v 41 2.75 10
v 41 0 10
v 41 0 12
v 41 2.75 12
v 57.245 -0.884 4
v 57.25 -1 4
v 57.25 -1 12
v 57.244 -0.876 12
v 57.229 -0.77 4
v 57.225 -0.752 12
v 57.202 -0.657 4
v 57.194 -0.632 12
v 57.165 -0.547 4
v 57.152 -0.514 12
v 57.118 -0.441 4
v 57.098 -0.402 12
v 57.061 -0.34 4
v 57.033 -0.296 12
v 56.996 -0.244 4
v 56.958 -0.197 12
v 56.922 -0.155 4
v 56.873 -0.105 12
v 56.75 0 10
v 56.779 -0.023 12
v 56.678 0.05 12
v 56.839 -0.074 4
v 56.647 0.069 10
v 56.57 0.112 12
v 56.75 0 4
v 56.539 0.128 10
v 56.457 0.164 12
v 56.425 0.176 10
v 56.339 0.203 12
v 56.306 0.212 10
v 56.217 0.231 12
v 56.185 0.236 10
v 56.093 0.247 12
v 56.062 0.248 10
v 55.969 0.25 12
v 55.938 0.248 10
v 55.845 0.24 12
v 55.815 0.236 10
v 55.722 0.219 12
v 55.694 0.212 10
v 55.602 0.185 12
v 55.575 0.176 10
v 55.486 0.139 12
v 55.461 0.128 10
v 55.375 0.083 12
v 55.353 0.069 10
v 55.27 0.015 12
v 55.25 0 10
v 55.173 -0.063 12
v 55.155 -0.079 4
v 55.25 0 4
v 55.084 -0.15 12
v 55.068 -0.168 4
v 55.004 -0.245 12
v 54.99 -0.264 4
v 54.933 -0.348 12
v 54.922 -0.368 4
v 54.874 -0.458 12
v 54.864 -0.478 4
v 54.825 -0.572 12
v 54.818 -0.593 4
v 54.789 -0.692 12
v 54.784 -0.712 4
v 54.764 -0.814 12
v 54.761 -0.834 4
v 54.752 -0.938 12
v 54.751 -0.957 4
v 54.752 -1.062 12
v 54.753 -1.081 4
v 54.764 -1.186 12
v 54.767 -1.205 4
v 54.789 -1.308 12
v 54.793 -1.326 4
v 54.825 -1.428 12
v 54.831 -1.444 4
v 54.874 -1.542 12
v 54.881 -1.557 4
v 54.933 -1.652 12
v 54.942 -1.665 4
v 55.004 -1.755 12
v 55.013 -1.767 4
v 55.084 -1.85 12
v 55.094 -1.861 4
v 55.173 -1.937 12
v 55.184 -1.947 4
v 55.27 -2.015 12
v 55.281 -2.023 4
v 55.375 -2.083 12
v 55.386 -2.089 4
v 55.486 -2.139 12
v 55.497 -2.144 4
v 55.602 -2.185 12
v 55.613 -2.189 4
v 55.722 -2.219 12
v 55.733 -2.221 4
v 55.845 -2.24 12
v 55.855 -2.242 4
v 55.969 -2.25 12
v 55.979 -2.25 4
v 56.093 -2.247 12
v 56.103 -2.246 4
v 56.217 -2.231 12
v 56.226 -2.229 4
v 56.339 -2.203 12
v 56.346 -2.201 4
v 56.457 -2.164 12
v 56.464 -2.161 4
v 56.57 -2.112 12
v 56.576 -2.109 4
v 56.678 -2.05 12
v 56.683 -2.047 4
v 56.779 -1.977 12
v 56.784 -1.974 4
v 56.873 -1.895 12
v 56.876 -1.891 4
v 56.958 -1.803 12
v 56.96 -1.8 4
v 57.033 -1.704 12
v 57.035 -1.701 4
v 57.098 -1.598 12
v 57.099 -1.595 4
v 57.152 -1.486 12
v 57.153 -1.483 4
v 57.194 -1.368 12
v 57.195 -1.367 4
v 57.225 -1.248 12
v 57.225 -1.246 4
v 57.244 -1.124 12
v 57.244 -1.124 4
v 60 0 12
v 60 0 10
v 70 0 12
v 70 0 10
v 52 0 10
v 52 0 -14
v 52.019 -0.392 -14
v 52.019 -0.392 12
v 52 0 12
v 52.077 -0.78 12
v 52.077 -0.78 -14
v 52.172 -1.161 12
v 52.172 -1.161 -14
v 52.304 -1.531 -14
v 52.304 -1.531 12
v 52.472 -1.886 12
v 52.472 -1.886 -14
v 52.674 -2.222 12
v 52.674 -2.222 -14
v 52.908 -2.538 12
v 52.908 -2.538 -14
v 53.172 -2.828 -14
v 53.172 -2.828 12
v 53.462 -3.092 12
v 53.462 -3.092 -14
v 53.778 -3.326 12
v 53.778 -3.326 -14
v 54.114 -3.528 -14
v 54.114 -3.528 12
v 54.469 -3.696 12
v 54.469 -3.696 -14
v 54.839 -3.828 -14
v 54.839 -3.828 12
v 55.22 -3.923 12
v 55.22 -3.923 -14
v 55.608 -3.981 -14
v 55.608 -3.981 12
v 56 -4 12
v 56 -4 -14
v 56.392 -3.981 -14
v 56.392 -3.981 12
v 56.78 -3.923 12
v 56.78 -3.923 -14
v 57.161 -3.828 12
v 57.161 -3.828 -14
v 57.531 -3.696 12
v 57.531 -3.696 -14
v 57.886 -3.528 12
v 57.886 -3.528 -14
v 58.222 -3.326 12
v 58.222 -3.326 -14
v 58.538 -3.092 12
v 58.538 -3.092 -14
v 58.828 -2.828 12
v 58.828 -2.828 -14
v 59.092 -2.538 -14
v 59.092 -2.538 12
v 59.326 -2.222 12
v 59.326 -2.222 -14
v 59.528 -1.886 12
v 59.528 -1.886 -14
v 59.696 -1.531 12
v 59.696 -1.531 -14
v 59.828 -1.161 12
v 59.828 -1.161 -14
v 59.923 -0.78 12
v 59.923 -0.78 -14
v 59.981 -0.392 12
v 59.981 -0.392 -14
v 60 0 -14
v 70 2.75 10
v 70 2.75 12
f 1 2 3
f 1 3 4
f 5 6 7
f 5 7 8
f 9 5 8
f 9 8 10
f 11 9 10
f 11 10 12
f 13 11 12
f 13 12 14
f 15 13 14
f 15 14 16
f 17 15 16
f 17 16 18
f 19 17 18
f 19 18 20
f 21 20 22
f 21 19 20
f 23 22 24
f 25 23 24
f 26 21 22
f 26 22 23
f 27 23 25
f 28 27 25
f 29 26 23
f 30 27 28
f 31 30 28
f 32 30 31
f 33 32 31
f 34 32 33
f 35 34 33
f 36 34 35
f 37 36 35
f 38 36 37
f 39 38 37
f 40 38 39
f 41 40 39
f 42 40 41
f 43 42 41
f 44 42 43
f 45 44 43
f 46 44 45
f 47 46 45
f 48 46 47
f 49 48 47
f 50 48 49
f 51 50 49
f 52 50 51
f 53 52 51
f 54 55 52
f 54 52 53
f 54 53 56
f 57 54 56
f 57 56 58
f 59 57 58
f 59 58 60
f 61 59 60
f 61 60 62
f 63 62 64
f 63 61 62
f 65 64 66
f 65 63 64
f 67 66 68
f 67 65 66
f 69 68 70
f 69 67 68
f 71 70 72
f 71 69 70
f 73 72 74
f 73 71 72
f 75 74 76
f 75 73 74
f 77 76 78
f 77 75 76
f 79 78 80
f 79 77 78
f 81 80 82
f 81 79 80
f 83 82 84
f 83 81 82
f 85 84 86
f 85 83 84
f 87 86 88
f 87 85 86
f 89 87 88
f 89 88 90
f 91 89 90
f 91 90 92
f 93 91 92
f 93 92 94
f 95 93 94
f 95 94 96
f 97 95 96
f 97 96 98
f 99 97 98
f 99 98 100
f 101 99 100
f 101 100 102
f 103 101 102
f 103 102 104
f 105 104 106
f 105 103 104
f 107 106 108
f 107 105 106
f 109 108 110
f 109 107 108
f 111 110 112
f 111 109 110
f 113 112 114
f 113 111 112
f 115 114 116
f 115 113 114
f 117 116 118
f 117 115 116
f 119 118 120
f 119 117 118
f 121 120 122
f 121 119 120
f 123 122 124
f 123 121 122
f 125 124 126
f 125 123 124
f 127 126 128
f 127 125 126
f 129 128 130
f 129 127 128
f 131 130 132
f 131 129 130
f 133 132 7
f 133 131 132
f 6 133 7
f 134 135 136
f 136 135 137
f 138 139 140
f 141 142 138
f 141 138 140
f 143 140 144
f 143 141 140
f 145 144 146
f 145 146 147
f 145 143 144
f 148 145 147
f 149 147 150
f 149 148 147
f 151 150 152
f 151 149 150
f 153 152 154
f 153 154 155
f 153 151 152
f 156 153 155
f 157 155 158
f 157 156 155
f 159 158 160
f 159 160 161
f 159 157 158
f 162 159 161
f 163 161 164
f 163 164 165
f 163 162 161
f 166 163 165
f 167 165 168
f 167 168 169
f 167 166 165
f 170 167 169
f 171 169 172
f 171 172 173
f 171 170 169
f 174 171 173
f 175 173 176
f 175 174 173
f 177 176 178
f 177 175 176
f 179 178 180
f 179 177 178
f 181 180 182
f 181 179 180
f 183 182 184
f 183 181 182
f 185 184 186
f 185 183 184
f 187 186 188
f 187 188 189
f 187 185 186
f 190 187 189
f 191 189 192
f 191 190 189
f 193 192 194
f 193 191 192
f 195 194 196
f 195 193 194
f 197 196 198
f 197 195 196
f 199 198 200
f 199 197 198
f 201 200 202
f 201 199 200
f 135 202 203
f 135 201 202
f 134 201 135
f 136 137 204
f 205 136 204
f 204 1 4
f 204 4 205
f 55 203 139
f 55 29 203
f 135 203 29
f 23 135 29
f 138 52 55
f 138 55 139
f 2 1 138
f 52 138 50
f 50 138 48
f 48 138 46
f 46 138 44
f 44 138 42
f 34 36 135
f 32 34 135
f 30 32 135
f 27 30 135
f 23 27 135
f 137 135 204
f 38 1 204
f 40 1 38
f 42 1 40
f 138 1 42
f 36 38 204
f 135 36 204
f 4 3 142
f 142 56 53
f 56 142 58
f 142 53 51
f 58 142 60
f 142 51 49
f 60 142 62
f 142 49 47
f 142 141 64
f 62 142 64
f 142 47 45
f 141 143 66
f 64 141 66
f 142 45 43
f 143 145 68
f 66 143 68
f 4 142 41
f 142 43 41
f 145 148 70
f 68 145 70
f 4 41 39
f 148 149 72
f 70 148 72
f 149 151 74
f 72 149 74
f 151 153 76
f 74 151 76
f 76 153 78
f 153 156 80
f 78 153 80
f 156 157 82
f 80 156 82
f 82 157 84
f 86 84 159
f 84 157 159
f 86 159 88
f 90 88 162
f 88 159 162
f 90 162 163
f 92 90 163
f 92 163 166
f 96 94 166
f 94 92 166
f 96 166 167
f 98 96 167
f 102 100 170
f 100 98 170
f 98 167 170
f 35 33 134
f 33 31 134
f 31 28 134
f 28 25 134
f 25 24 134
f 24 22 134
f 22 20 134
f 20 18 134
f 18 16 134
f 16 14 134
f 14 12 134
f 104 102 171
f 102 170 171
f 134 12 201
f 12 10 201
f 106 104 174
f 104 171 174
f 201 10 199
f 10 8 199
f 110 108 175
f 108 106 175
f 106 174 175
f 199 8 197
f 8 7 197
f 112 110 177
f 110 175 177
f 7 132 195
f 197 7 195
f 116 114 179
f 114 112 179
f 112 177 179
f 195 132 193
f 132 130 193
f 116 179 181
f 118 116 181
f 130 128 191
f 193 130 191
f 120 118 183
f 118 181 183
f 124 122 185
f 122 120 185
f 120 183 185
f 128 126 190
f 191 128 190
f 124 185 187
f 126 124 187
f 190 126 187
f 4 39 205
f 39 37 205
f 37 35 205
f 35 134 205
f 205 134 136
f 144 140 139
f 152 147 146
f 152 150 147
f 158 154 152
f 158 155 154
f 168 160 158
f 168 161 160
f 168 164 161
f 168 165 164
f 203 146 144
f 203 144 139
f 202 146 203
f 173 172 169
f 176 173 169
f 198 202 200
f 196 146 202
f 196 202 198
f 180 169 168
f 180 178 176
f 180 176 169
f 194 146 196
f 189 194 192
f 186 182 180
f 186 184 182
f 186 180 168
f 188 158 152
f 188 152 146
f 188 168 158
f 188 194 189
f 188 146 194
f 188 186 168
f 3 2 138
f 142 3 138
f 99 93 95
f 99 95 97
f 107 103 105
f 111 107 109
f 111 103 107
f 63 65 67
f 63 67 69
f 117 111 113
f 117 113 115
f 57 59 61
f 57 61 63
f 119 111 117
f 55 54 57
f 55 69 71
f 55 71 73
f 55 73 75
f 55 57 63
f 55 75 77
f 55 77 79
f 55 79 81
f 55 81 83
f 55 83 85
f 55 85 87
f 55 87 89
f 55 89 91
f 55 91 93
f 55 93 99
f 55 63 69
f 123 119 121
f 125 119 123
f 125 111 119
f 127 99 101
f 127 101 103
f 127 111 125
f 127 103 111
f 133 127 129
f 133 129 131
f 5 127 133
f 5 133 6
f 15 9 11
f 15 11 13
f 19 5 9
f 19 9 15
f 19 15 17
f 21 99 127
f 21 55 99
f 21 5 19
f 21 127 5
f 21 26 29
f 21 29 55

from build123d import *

# Parameters (mm, degrees)
CYLINDER007_R     = 1.25
CYLINDER007_DEPTH = 10
CYLINDER029_W     = 4
CYLINDER029_H     = 26
CYLINDER029_ANGLE = 180
BOX006_W          = 29
BOX006_H          = 2.75
BOX006_DEPTH      = 2


with BuildPart() as b_no:
    # Cylinder007 → Cylinder007 (new body)
    with BuildSketch(Plane(origin=(57, -1, 4), x_dir=(1, 0, 0), z_dir=(0, 0, 1))):
        Circle(CYLINDER007_R)
    extrude(amount=CYLINDER007_DEPTH)


with BuildPart() as s016:
    # Cylinder029 → Cylinder029 (revolve)
    with BuildSketch(Plane(origin=(57, 0, -14), x_dir=(-1, 0, 0), z_dir=(0, 1, 0))):
        with Locations((2, 13)):
            Rectangle(CYLINDER029_W, CYLINDER029_H)
    revolve(axis=Axis((57, 0, -14), (0, 0, 1)), revolution_arc=CYLINDER029_ANGLE)


with BuildPart() as cut014_sso:
    # Box006 → Box006 (new body)
    with BuildSketch(Plane(origin=(42, 0, 10), x_dir=(1, 0, 0), z_dir=(0, 0, 1))):
        with Locations((14.5, 1.375)):
            Rectangle(BOX006_W, BOX006_H)
    extrude(amount=BOX006_DEPTH)

    # Fusion008: union S016
    add(s016.part)

    # Cut014: cut B_NO
    add(b_no.part, mode=Mode.SUBTRACT)


with BuildPart() as cut014_sso_1:
    # Cut014 placement: moved
    add(cut014_sso.part.moved(Location((-1, 0, 0))))


solid = cut014_sso_1.part
